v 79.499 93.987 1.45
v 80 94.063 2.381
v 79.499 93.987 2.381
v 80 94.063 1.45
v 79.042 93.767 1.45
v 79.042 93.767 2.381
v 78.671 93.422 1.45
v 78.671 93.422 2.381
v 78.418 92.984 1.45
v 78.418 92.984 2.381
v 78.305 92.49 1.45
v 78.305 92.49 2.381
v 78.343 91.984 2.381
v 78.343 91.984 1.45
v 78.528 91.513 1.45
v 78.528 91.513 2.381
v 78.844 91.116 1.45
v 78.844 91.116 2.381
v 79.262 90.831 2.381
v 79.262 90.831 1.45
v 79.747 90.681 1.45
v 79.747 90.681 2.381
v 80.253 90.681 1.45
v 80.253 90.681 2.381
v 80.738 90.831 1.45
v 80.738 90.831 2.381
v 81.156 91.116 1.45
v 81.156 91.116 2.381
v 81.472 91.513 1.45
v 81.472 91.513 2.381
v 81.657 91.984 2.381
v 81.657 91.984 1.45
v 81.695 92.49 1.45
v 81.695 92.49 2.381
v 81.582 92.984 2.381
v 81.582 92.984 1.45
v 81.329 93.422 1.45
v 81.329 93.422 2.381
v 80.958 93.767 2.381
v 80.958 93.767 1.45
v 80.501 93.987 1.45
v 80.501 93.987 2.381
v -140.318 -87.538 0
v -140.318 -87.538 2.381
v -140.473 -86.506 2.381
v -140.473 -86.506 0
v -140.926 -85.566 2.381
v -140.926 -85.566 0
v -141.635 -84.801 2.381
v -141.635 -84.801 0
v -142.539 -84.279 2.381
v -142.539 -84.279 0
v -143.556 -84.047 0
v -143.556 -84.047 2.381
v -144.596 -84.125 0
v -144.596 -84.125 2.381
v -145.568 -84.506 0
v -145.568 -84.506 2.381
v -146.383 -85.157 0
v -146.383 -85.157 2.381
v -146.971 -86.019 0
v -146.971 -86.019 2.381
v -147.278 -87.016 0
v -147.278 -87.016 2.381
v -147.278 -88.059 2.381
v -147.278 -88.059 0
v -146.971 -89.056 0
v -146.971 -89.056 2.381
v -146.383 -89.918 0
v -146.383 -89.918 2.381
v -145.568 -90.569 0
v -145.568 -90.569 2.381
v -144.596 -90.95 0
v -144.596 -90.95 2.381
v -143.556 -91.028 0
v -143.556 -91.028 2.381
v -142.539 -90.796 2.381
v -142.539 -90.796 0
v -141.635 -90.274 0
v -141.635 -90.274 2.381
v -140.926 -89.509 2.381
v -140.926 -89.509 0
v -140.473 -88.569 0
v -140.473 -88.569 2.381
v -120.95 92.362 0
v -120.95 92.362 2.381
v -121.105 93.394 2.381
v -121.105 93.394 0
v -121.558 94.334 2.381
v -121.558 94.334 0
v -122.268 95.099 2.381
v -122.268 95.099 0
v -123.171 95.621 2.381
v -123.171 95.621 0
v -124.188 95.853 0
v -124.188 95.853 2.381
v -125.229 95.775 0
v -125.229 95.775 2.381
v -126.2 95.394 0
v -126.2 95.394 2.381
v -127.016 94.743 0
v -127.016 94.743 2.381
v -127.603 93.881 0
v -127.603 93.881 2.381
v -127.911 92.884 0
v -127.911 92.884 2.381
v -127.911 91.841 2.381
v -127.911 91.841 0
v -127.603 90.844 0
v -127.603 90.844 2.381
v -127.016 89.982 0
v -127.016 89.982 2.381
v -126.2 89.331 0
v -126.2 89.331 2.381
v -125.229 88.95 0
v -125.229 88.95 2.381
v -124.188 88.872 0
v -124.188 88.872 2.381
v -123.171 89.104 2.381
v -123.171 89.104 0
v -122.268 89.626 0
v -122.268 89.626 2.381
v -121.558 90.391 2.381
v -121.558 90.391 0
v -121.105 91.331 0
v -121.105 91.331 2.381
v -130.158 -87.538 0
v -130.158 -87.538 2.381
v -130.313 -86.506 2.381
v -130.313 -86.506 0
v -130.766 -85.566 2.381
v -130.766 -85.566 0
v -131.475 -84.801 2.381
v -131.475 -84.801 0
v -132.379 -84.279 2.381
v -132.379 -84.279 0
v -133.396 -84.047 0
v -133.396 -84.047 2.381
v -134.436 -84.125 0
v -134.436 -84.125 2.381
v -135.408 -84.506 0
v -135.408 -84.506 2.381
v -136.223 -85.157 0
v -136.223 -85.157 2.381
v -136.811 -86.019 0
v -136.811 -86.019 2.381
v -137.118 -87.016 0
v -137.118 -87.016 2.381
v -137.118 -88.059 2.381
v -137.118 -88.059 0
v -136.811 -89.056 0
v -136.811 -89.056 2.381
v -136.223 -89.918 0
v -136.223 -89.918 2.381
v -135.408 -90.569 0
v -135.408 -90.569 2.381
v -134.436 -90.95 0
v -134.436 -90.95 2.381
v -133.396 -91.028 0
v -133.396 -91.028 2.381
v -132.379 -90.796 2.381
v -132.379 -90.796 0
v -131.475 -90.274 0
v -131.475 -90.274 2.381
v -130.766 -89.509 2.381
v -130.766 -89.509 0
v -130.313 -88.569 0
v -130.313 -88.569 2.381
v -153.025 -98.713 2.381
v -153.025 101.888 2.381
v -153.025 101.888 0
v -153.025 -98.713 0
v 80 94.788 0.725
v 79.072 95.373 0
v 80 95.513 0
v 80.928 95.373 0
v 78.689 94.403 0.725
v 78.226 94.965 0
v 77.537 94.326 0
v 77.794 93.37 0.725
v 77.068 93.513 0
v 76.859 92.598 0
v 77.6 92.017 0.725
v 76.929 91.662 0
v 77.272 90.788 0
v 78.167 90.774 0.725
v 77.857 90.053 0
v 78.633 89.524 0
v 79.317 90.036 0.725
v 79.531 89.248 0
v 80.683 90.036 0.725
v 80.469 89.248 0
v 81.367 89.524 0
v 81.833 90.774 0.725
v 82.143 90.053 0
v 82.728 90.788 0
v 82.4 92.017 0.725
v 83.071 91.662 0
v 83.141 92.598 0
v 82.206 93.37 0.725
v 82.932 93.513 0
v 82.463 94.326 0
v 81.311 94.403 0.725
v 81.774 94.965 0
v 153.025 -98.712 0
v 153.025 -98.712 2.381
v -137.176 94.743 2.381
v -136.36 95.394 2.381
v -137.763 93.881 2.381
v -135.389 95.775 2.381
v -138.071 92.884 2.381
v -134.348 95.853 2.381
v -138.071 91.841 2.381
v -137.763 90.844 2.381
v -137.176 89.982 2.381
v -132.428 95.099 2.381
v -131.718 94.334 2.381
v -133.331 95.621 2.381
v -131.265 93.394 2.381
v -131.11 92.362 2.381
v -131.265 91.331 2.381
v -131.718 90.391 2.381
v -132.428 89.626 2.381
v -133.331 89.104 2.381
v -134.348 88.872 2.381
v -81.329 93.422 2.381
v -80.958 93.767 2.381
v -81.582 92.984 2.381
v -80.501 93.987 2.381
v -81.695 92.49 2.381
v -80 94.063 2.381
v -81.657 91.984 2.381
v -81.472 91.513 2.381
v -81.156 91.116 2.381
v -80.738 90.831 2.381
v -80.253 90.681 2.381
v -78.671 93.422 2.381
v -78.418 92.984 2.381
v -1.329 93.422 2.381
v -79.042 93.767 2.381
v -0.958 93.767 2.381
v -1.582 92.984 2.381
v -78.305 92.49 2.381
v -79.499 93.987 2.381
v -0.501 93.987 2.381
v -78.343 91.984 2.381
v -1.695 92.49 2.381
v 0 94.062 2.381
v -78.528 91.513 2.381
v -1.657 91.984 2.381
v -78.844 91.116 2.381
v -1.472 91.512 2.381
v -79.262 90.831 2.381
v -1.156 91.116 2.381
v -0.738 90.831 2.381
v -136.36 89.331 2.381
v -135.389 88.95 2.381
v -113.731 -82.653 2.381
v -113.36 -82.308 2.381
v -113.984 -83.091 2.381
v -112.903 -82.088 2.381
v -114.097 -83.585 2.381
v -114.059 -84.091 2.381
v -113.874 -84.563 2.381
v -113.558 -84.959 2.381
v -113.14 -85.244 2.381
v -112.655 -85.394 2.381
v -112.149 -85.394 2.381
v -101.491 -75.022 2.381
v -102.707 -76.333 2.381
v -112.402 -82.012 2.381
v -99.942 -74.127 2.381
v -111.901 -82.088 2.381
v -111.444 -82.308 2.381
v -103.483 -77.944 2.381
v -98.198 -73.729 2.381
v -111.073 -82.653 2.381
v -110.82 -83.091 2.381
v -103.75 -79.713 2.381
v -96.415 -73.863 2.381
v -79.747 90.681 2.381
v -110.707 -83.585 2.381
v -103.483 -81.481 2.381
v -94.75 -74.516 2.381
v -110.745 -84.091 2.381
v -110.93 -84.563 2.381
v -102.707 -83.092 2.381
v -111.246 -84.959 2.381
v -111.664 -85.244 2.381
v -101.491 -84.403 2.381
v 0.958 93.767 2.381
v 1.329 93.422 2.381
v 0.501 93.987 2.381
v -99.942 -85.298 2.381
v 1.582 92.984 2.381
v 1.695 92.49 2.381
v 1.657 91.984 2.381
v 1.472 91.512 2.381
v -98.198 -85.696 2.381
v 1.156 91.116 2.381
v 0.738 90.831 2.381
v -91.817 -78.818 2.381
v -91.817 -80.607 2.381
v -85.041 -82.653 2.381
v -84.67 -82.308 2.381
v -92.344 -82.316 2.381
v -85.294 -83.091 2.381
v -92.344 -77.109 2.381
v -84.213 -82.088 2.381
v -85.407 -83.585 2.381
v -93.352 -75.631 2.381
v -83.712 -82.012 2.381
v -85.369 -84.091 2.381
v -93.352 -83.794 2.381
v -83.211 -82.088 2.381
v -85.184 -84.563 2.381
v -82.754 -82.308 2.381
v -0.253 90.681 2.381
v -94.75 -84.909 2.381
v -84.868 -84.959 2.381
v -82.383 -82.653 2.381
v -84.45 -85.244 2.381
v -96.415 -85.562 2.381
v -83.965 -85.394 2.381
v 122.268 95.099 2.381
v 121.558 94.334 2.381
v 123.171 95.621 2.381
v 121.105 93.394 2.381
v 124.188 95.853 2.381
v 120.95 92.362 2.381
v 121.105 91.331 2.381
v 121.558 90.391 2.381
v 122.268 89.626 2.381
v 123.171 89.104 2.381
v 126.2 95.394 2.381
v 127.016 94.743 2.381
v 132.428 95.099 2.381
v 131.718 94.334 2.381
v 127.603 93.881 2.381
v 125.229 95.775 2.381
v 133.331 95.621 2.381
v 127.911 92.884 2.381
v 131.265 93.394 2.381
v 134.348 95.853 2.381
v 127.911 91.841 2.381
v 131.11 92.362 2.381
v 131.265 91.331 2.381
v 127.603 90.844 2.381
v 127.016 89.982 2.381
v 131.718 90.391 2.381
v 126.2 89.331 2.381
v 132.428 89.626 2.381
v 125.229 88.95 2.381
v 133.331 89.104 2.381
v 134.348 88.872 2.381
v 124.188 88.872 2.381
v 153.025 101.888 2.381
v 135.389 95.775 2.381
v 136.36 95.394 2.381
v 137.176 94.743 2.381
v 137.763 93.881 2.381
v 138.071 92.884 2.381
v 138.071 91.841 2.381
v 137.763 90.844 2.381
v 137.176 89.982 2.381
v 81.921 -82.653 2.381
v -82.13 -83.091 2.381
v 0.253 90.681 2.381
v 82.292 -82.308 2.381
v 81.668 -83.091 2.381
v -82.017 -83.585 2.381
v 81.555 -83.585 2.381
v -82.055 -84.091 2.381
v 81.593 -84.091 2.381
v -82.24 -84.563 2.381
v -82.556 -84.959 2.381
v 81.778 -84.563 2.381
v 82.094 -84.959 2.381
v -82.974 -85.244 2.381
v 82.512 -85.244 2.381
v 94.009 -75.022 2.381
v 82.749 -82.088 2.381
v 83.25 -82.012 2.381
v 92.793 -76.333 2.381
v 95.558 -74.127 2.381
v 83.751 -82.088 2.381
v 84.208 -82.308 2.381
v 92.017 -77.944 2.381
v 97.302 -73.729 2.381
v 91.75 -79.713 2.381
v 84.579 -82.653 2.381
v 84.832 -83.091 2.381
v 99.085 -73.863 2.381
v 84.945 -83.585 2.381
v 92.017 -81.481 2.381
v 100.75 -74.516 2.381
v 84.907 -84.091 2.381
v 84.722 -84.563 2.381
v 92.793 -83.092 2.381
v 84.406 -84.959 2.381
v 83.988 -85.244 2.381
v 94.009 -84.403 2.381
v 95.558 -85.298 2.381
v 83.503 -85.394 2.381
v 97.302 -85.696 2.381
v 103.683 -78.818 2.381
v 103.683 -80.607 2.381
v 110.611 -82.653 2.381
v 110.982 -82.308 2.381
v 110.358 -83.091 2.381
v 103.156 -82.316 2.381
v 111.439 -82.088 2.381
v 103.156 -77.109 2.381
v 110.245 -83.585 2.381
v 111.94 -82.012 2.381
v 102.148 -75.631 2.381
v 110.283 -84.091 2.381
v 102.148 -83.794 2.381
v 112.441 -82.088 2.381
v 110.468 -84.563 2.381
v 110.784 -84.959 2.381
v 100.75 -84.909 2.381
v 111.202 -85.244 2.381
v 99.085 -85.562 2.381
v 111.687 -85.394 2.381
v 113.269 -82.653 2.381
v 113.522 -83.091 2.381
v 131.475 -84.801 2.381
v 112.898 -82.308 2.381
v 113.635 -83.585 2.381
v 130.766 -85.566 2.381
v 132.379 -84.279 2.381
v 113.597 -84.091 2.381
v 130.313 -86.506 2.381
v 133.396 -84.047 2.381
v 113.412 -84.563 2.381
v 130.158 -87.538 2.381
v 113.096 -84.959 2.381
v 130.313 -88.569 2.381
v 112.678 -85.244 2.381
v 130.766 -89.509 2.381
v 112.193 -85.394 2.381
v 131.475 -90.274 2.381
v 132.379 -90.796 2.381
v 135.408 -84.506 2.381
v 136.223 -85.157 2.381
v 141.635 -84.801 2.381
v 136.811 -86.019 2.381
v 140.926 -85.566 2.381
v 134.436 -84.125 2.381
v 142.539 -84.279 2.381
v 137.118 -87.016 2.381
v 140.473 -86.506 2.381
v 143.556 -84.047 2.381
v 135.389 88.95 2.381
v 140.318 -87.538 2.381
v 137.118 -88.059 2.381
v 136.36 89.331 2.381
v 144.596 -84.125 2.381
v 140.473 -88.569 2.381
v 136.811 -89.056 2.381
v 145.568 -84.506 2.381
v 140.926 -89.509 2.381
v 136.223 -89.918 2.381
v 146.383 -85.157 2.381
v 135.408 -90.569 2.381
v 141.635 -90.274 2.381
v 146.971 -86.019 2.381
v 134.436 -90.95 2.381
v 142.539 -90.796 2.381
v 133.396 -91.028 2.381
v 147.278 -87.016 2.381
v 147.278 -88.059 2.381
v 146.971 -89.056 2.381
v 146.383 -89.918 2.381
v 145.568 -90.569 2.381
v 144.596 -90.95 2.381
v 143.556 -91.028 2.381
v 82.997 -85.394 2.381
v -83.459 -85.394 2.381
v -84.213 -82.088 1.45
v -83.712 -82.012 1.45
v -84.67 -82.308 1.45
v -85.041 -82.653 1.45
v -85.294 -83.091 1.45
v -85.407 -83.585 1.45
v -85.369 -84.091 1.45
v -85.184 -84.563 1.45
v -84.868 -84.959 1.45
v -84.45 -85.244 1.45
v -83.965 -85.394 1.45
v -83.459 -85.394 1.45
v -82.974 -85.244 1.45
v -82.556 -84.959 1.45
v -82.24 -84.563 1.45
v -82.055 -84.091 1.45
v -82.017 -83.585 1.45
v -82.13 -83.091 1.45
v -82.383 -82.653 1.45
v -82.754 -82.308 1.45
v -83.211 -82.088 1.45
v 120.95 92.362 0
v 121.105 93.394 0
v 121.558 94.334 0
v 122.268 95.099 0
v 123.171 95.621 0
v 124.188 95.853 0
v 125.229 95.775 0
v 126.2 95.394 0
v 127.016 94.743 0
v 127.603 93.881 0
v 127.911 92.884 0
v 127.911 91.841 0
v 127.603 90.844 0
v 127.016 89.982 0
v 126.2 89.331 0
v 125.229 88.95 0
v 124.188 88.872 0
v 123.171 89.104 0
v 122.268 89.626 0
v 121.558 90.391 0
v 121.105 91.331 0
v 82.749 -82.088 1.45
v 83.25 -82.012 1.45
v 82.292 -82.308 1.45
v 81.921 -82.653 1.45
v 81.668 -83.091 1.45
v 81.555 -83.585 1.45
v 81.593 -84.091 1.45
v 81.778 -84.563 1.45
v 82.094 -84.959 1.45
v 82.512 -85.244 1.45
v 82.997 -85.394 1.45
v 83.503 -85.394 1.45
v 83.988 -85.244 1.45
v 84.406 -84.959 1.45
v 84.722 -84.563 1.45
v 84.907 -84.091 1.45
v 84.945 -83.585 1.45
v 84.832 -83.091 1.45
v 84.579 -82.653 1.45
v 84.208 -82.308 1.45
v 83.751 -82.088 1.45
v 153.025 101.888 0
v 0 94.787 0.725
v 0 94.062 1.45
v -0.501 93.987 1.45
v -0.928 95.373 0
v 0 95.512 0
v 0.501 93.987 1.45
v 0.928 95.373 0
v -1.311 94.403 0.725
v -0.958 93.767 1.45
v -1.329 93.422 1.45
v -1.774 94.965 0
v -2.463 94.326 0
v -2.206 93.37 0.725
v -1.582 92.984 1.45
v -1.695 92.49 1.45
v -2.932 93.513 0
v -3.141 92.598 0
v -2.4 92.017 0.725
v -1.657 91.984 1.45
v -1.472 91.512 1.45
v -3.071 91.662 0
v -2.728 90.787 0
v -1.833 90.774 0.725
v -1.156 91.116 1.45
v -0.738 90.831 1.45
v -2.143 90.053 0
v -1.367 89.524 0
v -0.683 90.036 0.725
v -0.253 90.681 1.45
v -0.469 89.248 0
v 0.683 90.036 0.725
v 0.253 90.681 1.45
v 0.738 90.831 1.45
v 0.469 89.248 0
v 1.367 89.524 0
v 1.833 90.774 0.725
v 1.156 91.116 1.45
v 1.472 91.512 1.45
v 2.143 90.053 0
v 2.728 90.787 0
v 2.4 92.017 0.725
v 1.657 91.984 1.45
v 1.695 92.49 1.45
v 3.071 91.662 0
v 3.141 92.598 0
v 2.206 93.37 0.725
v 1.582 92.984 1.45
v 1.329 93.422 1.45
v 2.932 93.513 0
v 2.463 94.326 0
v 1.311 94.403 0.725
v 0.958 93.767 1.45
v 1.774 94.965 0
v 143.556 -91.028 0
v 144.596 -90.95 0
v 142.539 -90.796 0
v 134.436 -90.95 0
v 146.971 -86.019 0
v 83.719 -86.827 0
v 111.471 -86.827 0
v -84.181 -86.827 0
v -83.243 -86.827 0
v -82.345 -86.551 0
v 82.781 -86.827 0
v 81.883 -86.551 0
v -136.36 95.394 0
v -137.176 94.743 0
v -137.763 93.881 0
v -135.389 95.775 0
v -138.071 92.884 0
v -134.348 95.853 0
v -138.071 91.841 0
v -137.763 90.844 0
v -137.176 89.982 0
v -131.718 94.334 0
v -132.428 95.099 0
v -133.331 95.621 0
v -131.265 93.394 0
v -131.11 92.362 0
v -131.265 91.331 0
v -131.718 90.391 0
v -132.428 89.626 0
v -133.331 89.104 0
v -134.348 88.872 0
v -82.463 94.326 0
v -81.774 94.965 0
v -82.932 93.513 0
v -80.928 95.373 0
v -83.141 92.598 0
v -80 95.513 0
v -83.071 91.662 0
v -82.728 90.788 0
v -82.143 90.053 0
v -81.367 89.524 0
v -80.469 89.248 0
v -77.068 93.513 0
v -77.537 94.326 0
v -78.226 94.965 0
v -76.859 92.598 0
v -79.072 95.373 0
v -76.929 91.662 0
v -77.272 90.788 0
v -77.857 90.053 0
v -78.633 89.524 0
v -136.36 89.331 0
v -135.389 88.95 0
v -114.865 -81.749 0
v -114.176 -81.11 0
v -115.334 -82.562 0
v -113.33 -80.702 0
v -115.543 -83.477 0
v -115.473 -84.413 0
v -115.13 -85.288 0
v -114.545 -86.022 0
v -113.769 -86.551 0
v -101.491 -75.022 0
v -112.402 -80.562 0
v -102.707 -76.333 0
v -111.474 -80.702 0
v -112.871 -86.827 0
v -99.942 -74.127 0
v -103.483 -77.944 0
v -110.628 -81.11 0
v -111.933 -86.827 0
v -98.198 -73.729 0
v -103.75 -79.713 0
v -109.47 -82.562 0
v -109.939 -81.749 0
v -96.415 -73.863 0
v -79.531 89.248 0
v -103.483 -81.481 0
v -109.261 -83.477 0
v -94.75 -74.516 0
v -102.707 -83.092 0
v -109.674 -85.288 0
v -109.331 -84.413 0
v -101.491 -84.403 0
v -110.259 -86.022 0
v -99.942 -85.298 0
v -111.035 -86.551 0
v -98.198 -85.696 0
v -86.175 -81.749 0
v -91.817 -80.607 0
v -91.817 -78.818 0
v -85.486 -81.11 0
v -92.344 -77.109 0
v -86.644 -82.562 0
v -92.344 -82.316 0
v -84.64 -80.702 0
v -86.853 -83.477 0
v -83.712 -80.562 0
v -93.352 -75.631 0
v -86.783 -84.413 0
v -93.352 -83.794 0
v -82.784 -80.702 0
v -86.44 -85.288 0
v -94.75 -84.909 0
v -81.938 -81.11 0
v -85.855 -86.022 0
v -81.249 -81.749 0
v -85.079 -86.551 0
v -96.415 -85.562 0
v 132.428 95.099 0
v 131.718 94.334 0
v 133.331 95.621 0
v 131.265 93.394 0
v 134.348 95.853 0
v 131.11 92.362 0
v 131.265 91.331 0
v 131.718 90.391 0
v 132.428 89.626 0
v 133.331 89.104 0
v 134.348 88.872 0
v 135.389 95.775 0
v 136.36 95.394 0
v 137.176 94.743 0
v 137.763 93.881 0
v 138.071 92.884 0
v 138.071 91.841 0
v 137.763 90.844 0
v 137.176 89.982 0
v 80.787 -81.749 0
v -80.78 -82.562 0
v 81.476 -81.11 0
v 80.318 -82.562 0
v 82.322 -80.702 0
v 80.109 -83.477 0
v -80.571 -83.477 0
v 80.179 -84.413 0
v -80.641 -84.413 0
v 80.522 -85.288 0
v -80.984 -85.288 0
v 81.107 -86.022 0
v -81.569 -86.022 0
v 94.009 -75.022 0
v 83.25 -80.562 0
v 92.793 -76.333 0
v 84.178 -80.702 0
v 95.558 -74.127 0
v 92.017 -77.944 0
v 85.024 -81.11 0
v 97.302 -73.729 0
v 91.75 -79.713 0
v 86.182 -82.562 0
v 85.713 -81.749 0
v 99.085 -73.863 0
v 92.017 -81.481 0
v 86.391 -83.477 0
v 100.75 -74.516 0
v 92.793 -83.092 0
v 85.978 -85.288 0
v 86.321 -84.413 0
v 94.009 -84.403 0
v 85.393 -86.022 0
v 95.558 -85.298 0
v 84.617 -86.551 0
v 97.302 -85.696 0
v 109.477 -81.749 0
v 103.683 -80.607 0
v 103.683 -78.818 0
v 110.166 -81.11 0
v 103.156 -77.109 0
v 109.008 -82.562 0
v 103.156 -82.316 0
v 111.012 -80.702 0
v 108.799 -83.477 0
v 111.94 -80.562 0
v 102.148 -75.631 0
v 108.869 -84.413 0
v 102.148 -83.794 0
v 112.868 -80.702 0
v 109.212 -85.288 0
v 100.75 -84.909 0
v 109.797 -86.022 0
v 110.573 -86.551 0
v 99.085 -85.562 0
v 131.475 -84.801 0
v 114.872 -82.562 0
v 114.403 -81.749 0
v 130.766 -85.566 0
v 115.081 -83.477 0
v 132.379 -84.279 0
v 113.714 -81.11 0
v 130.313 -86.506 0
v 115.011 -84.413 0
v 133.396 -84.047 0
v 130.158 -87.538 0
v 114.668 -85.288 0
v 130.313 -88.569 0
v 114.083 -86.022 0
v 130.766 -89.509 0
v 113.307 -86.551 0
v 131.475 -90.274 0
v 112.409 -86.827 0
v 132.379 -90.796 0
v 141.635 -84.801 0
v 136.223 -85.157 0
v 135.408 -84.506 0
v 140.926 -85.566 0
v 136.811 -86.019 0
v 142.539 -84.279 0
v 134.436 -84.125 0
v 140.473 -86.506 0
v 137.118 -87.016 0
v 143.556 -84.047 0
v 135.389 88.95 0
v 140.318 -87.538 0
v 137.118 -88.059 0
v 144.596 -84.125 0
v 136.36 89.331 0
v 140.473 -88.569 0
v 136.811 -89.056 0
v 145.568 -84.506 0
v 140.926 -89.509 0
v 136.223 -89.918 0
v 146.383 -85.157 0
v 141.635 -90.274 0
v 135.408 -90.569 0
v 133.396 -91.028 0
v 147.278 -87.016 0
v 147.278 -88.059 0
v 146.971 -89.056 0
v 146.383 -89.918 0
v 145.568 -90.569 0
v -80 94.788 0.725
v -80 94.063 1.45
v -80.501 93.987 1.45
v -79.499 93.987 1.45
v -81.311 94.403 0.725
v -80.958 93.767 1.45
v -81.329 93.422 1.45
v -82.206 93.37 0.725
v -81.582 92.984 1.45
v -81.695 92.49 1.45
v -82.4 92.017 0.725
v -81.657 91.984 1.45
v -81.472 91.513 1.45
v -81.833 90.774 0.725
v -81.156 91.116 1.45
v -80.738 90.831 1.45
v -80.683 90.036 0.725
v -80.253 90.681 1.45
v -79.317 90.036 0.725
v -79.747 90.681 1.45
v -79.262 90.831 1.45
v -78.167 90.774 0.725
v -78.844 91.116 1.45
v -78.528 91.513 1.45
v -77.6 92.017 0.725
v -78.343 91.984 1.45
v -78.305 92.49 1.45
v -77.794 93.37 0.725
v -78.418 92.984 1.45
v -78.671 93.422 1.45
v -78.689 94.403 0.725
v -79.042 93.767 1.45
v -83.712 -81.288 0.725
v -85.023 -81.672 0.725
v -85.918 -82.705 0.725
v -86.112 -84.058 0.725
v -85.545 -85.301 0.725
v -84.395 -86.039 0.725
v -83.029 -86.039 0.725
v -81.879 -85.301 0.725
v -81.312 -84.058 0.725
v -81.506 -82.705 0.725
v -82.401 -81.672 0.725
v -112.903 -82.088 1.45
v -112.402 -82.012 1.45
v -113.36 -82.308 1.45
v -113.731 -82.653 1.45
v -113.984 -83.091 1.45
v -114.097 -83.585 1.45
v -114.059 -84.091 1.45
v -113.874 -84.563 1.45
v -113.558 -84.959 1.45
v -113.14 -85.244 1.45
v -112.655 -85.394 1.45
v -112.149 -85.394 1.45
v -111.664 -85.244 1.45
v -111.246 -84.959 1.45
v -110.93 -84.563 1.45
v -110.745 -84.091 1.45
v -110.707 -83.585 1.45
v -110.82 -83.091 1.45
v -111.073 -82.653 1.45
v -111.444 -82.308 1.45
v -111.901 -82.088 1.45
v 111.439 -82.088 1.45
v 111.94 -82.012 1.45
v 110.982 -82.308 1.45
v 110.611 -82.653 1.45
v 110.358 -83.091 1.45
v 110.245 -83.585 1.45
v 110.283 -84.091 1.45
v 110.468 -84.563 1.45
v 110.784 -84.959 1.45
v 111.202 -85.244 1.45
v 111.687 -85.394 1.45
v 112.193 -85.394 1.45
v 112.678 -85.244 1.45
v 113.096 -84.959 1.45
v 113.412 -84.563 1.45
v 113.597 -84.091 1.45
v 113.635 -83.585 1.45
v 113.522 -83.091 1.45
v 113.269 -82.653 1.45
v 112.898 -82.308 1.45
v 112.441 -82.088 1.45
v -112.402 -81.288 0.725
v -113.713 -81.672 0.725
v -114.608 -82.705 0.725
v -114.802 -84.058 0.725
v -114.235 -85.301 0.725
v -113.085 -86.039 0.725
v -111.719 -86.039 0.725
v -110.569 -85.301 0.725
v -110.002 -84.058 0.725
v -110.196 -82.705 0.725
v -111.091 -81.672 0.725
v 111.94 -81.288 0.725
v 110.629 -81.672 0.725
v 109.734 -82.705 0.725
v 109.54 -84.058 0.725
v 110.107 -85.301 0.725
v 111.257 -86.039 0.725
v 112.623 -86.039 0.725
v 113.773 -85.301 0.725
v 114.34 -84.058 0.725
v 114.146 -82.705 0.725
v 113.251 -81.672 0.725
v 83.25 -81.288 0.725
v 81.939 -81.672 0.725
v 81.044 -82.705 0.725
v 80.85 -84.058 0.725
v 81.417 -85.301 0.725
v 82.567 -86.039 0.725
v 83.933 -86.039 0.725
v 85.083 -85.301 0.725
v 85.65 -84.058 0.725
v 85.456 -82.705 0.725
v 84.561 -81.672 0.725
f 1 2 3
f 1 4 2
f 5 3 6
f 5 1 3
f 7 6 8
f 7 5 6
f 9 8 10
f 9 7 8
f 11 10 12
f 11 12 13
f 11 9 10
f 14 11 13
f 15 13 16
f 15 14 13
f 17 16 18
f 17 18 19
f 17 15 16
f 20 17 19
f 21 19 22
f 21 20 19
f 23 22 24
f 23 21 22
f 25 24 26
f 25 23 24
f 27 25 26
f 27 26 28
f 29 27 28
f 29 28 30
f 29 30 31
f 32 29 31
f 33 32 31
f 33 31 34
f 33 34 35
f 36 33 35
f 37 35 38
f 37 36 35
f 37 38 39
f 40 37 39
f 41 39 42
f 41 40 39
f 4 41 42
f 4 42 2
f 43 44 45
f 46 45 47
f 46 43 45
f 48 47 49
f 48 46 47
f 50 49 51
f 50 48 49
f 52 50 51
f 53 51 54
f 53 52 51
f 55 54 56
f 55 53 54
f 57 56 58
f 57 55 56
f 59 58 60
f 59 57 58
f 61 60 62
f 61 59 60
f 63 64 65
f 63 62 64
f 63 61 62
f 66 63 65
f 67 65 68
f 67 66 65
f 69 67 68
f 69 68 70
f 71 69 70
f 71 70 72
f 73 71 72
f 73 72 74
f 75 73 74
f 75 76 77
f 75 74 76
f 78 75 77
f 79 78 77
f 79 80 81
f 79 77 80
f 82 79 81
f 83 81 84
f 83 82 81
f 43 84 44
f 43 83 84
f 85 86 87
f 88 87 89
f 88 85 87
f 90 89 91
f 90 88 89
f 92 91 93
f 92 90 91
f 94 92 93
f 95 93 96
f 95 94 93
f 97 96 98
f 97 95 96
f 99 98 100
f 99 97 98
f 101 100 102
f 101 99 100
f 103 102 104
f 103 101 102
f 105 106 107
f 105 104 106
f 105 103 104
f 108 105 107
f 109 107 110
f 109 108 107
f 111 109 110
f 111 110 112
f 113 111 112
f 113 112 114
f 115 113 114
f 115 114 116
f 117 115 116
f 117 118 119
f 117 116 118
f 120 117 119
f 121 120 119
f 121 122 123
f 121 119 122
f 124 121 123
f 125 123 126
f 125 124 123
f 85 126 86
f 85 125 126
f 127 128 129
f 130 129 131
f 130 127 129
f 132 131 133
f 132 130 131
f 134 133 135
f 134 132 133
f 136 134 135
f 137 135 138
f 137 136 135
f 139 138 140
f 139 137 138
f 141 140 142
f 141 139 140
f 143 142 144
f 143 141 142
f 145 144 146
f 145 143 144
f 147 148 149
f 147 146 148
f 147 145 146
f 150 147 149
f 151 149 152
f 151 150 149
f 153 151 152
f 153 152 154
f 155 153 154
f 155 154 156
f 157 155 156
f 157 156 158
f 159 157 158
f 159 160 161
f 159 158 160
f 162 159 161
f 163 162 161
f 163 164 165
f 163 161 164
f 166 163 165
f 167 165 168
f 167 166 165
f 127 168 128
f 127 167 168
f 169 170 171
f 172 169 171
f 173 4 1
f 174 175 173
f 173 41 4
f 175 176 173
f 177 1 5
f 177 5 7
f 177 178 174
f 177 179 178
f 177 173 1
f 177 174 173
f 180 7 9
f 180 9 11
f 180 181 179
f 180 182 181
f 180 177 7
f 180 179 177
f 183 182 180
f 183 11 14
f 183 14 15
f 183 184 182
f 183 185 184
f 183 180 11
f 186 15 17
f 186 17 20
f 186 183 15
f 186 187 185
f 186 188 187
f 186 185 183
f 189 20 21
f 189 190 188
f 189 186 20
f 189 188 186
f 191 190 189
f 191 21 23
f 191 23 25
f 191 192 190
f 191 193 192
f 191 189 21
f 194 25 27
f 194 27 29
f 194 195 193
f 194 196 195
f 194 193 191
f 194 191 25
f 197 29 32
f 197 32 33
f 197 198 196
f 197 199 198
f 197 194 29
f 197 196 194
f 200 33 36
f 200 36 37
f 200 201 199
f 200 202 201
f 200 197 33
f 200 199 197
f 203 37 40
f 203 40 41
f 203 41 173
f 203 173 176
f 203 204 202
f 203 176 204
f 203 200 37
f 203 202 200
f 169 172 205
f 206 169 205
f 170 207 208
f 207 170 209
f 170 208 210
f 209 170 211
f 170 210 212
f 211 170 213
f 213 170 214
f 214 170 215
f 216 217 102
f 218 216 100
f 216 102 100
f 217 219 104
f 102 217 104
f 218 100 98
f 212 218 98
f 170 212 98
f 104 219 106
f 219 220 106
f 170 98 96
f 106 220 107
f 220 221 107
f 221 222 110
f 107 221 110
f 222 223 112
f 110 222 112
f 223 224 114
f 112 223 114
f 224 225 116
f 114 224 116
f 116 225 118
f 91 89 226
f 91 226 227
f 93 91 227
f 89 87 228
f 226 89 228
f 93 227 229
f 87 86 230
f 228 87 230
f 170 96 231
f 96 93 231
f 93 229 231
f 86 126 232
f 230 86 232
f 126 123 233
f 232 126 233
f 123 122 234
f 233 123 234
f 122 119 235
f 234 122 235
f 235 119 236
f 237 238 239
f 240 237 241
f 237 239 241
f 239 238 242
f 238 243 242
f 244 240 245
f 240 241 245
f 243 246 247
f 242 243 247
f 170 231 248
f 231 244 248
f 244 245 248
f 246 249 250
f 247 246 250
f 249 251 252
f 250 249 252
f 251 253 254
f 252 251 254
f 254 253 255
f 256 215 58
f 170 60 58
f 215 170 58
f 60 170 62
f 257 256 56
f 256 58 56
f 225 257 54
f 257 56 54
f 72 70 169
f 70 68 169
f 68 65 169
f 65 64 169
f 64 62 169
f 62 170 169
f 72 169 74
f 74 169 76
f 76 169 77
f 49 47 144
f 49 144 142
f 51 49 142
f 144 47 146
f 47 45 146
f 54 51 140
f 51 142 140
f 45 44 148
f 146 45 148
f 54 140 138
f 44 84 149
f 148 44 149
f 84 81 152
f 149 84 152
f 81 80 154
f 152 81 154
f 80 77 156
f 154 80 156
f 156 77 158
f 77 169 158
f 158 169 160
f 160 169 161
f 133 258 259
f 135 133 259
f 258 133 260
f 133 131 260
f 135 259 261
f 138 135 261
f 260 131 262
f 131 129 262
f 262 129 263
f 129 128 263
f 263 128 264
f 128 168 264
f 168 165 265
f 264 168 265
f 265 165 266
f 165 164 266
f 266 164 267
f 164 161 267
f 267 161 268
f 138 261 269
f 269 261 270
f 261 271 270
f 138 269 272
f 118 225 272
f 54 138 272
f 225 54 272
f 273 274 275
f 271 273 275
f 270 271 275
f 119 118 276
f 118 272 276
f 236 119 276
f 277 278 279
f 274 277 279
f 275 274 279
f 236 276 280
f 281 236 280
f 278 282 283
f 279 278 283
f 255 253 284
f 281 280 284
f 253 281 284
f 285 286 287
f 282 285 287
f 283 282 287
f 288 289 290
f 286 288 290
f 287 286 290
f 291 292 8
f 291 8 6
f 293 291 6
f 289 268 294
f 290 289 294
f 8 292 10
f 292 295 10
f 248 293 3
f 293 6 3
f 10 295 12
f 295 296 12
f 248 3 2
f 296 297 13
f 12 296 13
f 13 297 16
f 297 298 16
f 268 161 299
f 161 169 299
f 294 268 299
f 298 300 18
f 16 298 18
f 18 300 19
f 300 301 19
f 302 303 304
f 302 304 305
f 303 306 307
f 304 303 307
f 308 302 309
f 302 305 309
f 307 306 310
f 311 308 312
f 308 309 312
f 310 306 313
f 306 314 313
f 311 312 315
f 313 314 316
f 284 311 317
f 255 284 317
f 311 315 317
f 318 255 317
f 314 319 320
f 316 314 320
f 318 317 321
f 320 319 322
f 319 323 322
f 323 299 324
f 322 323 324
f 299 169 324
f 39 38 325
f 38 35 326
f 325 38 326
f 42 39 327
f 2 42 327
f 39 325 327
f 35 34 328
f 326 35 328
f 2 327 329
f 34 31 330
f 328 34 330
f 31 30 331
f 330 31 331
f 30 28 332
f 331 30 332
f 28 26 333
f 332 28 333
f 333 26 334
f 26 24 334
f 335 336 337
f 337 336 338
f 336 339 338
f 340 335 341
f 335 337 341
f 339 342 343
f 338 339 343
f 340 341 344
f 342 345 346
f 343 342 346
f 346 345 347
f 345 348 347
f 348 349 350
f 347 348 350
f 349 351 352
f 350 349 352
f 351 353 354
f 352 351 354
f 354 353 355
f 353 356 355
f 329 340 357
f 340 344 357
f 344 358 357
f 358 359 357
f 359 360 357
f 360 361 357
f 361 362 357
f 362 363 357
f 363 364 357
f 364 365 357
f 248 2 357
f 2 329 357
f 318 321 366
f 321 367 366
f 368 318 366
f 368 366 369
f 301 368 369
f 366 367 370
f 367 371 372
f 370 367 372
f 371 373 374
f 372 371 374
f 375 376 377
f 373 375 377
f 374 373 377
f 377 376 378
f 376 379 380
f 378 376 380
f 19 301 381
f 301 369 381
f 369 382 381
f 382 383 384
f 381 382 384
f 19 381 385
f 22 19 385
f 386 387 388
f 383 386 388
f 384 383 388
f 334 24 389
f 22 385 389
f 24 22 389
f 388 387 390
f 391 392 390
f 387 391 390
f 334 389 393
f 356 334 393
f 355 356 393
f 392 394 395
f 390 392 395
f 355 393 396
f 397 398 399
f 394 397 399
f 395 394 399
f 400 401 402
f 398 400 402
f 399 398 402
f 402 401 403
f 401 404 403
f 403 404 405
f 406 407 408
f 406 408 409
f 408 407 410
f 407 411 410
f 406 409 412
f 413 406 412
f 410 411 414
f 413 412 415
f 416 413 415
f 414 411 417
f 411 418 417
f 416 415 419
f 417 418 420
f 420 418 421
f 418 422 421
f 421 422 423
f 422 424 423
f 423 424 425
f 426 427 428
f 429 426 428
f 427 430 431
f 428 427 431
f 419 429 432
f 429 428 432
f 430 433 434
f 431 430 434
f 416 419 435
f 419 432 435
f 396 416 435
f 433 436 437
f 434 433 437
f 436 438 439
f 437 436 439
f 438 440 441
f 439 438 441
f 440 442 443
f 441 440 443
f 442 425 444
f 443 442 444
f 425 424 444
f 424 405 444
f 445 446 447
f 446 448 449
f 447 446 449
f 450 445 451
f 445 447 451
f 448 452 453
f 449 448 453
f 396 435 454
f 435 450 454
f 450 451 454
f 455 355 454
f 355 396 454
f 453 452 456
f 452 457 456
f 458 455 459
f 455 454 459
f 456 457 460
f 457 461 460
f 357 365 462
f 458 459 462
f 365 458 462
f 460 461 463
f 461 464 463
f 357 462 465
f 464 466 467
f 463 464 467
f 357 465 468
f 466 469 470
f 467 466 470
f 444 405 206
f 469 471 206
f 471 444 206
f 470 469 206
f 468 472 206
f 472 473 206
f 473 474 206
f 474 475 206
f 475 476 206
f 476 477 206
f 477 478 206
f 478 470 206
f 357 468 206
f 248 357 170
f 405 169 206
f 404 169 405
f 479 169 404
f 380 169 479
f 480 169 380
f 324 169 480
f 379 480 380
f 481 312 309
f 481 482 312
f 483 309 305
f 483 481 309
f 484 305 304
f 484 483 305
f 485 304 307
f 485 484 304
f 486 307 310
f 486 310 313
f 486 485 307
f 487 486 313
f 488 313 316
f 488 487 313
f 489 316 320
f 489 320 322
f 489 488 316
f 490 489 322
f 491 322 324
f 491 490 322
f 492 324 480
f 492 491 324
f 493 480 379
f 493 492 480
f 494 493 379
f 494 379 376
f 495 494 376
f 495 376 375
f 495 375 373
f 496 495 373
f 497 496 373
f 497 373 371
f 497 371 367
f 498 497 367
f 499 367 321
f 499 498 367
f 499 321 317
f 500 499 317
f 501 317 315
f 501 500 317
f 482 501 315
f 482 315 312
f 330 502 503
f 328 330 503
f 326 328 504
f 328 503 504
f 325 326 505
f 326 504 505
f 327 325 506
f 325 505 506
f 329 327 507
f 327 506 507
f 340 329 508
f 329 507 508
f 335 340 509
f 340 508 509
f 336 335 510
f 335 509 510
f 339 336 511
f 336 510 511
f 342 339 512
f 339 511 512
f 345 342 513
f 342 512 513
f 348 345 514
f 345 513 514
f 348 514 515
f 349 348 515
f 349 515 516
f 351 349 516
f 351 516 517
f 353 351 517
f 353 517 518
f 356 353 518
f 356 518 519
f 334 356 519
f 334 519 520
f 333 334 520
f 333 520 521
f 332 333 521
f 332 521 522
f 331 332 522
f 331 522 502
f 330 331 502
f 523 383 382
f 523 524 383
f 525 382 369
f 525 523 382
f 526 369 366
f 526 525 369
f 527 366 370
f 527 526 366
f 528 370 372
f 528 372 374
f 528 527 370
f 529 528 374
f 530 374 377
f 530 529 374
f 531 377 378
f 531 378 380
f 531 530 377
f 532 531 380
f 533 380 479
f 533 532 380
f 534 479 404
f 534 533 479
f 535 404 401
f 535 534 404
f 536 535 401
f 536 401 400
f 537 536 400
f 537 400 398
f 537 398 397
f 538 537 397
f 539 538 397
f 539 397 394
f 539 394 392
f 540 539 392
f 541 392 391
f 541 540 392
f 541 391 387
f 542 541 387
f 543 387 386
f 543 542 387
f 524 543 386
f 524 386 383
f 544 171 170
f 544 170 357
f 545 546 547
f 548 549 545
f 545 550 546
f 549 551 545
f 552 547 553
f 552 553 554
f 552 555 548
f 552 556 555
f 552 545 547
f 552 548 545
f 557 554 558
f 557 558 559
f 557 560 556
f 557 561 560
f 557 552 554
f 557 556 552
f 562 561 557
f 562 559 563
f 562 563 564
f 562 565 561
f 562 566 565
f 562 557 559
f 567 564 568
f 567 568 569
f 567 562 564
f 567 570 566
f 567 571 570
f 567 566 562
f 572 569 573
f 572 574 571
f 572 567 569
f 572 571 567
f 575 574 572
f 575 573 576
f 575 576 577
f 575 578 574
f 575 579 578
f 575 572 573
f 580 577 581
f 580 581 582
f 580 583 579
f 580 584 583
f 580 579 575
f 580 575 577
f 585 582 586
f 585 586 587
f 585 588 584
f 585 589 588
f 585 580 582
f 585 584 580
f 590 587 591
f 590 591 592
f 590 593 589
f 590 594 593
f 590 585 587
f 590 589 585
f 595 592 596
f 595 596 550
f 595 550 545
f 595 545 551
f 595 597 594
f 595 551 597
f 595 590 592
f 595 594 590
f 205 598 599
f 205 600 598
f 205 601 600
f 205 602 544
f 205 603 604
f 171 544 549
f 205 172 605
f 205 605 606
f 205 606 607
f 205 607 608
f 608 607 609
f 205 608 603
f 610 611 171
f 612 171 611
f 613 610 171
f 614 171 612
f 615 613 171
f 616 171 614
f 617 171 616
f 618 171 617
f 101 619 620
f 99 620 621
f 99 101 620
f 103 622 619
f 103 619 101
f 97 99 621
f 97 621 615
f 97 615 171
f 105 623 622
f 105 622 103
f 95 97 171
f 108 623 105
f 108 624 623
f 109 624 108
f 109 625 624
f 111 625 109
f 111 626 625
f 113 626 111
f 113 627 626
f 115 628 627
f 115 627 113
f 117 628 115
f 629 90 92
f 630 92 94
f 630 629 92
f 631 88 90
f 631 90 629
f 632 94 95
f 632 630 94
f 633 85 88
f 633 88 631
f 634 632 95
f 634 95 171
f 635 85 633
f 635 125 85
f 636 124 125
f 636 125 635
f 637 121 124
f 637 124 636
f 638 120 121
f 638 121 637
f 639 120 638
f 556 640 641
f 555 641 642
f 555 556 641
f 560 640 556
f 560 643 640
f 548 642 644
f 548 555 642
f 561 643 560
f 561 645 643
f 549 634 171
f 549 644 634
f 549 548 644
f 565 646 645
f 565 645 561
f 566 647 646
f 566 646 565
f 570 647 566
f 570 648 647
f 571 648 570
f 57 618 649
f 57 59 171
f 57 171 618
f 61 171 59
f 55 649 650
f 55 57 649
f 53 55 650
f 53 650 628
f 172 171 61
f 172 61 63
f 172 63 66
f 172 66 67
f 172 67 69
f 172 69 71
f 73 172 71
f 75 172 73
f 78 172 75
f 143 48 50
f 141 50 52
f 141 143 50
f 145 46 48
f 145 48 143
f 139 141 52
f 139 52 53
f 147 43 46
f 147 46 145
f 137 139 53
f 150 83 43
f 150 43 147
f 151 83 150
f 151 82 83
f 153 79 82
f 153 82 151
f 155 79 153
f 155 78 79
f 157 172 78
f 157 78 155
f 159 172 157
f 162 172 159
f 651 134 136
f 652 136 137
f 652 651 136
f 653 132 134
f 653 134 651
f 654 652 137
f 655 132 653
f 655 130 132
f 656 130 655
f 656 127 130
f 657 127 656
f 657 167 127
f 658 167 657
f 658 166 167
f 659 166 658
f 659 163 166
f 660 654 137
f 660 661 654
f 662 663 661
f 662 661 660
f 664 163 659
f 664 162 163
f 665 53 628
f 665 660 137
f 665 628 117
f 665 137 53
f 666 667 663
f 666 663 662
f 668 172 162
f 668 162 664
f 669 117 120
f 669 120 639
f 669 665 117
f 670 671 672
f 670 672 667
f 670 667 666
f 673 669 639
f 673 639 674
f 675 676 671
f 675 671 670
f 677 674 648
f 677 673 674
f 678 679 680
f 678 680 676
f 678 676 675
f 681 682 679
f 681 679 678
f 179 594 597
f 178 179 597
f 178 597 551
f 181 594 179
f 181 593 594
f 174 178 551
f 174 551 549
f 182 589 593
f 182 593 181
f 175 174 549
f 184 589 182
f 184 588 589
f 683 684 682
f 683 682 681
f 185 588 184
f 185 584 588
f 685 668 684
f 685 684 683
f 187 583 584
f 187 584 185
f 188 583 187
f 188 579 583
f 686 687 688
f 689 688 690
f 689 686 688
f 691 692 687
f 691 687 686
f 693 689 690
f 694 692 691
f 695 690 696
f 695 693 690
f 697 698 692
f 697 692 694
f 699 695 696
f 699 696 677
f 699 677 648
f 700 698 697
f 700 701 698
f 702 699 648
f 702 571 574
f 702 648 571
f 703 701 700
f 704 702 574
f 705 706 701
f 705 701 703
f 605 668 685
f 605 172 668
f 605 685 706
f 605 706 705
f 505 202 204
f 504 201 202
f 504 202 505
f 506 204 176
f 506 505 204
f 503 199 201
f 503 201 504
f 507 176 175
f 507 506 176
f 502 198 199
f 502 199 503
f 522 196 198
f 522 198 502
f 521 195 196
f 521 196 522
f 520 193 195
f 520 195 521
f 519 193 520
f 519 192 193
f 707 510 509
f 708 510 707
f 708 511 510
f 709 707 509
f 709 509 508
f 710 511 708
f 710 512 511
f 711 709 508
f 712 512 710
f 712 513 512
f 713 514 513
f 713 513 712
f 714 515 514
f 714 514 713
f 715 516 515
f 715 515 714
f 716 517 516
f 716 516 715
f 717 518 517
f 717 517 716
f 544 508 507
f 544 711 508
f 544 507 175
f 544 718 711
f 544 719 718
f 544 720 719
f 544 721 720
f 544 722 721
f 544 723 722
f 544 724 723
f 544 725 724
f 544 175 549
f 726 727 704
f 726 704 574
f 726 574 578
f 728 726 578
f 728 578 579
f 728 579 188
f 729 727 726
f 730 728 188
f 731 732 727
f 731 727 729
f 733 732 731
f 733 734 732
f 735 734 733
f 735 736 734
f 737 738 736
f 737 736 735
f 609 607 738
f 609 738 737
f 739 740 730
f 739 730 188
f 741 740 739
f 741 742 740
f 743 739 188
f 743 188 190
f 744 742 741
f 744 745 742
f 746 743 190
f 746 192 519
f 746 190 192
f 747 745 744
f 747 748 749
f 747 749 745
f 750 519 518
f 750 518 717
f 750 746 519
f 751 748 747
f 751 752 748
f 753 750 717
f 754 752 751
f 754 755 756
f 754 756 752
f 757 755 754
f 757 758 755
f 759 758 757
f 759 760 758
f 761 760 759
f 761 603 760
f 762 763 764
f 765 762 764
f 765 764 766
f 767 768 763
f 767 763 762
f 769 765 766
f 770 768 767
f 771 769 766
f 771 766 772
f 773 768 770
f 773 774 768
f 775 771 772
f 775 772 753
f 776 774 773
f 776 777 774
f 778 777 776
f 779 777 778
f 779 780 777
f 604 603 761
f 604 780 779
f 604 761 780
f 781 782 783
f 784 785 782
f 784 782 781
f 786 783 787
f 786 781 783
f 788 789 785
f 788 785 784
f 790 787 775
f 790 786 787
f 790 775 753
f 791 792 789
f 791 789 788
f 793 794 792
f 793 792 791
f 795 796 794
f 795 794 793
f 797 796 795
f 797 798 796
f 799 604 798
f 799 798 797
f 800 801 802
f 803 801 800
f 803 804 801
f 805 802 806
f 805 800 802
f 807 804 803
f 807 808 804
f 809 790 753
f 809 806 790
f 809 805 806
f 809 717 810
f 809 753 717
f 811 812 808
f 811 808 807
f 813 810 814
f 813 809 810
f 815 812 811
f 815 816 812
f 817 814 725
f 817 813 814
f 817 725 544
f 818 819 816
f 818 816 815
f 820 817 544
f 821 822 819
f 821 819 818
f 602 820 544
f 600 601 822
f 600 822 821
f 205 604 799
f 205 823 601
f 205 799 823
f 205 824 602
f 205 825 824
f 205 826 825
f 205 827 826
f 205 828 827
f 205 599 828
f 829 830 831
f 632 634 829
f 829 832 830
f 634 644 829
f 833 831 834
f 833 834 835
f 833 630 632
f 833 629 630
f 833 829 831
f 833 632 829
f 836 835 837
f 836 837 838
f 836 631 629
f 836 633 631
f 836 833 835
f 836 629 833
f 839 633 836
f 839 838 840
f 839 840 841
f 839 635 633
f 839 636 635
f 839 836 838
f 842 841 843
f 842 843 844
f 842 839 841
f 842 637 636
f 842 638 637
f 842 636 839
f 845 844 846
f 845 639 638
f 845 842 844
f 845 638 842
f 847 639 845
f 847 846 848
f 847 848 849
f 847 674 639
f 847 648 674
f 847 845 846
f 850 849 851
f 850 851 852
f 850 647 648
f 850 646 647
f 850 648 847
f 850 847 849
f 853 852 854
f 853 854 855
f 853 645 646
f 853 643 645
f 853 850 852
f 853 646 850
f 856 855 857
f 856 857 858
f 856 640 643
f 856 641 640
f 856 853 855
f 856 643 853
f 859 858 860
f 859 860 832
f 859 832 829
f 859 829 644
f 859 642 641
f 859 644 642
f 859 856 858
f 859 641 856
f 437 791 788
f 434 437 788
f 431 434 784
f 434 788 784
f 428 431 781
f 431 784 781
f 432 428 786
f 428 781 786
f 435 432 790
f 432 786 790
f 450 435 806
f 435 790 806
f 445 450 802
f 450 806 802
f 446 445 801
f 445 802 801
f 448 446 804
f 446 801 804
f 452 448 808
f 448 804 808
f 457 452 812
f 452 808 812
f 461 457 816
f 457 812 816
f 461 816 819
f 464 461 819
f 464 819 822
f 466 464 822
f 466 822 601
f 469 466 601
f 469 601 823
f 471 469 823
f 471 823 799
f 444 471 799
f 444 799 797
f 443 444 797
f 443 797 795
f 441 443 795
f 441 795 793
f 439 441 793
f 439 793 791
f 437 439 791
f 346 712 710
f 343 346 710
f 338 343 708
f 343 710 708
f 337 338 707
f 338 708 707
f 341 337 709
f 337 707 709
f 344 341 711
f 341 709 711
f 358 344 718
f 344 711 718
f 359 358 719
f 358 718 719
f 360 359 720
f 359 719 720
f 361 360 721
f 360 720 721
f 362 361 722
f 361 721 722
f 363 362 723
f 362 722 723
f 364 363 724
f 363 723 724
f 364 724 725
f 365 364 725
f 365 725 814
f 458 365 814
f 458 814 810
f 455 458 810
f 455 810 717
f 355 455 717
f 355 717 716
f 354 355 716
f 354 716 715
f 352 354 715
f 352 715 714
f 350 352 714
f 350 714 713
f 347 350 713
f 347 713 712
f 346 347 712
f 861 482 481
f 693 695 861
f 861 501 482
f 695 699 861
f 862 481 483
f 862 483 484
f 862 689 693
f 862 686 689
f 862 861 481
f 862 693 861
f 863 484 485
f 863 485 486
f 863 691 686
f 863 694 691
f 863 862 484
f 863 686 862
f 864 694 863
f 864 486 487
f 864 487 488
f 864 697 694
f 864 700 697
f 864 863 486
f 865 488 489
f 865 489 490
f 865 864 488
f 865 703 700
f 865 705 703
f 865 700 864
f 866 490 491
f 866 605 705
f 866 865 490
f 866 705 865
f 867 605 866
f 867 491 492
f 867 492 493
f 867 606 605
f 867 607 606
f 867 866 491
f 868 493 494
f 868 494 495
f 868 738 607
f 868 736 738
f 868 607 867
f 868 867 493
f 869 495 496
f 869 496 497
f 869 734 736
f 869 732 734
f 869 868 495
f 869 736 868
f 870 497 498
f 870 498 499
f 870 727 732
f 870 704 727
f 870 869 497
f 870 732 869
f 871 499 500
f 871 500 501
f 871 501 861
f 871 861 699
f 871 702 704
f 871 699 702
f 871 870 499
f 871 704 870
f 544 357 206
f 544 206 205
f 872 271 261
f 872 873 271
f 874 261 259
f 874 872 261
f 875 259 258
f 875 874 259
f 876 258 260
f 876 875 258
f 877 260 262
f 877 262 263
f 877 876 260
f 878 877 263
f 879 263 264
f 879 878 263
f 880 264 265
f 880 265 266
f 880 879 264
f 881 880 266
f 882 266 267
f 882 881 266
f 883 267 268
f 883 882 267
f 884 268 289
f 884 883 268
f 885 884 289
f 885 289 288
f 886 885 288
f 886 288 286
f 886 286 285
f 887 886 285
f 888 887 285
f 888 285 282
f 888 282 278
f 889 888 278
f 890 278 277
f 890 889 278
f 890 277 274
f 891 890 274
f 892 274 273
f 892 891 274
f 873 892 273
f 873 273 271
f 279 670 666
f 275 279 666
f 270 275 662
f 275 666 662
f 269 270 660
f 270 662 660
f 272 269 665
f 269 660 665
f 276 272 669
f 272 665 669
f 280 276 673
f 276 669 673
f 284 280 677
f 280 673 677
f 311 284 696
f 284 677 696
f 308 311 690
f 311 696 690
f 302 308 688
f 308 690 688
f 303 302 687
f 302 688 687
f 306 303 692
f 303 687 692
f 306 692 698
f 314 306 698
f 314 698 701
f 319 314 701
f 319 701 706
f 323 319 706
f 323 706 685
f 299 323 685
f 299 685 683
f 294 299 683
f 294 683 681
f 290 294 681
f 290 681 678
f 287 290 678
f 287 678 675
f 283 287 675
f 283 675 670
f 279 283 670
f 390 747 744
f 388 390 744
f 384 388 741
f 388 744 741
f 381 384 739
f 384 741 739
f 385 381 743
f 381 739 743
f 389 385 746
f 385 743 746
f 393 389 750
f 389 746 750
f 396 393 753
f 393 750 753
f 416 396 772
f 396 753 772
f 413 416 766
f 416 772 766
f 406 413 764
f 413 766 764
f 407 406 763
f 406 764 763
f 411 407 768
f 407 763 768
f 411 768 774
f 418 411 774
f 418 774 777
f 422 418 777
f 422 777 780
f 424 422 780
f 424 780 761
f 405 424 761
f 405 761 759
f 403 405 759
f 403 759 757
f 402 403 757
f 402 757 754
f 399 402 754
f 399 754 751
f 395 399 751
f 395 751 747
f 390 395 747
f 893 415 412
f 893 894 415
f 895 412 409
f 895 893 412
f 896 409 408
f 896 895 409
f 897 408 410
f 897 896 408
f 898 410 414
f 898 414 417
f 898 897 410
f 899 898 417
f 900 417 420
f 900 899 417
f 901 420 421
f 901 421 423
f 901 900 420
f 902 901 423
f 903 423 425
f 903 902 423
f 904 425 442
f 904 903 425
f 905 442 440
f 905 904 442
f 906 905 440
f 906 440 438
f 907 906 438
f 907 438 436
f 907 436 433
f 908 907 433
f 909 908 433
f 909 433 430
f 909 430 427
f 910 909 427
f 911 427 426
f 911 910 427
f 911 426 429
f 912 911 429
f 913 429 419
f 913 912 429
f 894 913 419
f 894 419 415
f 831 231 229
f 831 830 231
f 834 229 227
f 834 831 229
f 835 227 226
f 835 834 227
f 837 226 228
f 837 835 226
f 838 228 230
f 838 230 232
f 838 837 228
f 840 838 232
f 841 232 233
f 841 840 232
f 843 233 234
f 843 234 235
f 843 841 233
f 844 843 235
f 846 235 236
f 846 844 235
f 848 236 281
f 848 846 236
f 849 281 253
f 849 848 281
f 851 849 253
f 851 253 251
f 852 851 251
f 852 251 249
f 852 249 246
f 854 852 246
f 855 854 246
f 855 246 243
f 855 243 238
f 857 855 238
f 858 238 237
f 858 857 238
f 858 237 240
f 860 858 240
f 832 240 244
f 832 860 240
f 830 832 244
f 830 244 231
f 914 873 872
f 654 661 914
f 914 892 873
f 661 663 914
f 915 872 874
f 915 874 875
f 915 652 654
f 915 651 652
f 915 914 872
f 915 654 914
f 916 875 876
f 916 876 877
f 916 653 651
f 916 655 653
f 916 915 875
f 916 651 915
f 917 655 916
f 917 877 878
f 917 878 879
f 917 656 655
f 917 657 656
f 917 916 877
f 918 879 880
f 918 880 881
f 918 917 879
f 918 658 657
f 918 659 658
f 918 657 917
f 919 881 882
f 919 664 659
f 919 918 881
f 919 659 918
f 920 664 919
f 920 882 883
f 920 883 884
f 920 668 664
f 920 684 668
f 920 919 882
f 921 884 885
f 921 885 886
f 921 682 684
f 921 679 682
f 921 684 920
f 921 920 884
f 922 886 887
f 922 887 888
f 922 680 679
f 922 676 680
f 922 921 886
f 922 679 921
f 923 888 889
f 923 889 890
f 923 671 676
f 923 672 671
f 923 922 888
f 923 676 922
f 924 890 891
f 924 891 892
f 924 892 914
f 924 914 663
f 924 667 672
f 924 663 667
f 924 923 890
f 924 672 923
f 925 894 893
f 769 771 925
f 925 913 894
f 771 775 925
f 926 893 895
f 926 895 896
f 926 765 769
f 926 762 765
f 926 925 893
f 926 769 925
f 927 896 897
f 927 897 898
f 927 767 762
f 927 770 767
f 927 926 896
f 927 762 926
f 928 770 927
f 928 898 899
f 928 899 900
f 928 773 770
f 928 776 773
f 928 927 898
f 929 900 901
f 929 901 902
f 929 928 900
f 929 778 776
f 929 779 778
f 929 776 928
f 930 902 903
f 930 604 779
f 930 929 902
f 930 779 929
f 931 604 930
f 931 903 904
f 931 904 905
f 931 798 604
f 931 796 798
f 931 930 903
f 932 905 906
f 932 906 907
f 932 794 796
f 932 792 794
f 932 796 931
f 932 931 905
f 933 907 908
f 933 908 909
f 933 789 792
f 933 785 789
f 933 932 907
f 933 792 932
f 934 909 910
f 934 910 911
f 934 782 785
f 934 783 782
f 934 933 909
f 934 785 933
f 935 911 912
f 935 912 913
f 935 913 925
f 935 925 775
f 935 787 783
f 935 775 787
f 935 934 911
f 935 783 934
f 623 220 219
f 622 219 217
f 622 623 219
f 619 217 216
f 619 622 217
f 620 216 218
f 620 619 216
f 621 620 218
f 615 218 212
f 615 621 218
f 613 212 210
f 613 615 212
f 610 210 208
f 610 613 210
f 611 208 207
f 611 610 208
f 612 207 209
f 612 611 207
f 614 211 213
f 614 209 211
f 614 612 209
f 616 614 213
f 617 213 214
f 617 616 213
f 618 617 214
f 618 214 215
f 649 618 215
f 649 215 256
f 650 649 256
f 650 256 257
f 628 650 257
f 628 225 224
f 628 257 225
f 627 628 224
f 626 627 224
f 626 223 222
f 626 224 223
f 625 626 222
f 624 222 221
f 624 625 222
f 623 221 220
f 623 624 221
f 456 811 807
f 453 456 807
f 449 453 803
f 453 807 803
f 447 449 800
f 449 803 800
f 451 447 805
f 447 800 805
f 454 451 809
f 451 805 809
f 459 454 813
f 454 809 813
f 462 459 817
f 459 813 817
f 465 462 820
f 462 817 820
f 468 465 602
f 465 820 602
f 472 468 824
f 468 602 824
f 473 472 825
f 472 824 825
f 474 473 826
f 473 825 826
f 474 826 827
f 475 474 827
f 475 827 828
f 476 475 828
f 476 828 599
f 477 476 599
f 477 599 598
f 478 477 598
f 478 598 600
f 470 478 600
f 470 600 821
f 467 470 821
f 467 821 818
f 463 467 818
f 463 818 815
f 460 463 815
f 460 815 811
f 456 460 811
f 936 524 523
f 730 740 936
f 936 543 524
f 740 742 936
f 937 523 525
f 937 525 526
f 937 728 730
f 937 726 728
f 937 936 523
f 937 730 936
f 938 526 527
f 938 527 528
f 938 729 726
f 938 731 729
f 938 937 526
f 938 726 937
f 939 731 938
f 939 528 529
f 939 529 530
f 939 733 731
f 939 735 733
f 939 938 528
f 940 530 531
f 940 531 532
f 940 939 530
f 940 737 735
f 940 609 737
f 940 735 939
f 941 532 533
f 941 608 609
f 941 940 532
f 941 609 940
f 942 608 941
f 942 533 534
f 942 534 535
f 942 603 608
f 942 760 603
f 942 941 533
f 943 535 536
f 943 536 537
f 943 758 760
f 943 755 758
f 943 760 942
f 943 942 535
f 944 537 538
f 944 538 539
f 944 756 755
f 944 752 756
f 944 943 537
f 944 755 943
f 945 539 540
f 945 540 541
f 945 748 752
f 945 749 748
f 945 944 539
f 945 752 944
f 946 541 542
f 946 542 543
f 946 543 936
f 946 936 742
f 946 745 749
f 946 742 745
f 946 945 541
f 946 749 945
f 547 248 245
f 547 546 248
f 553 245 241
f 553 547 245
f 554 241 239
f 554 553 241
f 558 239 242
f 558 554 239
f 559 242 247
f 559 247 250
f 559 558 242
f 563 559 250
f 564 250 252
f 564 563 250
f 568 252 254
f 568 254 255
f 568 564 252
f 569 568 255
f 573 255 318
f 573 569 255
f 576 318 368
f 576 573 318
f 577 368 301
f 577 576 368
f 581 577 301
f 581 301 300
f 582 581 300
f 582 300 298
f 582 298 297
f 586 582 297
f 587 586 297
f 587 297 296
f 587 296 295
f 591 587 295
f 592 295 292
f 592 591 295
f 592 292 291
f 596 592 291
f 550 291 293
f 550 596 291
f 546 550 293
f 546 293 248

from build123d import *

# Parameters (mm, degrees)
SKETCH1_W                                      = 306.05
SKETCH1_H                                      = 197.425
SKETCH1_R                                      = 10.775
BOSS_EXTRUDE1_DEPTH                            = 2.38125
SKETCH9_W                                      = 306.05
SKETCH9_H                                      = 2.38125
BOSS_EXTRUDE2_DEPTH                            = 3.175
SKETCH10_R                                     = 3.5
CUT_EXTRUDE1_DEPTH                             = 184.856965146
CSK_FOR_M3_FLAT_HEAD_MACHINE_SCREW1_AT_2_COUNT = 2
CSK_FOR_M3_FLAT_HEAD_MACHINE_SCREW1_AT_2_PITCH = 28.69
CSK_FOR_M3_FLAT_HEAD_MACHINE_SCREW1_AT_3_COUNT = 2
CSK_FOR_M3_FLAT_HEAD_MACHINE_SCREW1_AT_3_PITCH = 178.948509983
CSK_FOR_M3_FLAT_HEAD_MACHINE_SCREW1_AT_4_COUNT = 2
CSK_FOR_M3_FLAT_HEAD_MACHINE_SCREW1_AT_4_PITCH = 208.645558843
CSK_FOR_M3_FLAT_HEAD_MACHINE_SCREW1_AT_5_COUNT = 2
CSK_FOR_M3_FLAT_HEAD_MACHINE_SCREW1_AT_5_PITCH = 260.467597265
CSK_FOR_M3_FLAT_HEAD_MACHINE_SCREW1_AT_6_COUNT = 2
CSK_FOR_M3_FLAT_HEAD_MACHINE_SCREW1_AT_6_PITCH = 224.342
CSK_FOR_M3_FLAT_HEAD_MACHINE_SCREW1_AT_7_COUNT = 2
CSK_FOR_M3_FLAT_HEAD_MACHINE_SCREW1_AT_7_PITCH = 195.652
SKETCH13_R                                     = 6
CUT_EXTRUDE2_DEPTH                             = 184.856965146


with BuildPart() as part:
    # Sketch1 → Boss-Extrude1 (new body)
    # profile 1 of 5: a face of its own
    with BuildSketch(Plane.XY):
        Rectangle(SKETCH1_W, SKETCH1_H)
        with Locations((-142.25, -87.9375)):
            Circle(SKETCH1_R, mode=Mode.SUBTRACT)
        with Locations((-130.25, -64.9375)):
            Circle(SKETCH1_R, mode=Mode.SUBTRACT)
    # profile 2 of 5: a face of its own
    with BuildSketch(Plane.XY):
        with Locations((-130.25, -64.9375)):
            Circle(SKETCH1_R)
    # profile 3 of 5: a face of its own
    with BuildSketch(Plane.XY):
        with Locations((-142.25, -87.9375)):
            Circle(SKETCH1_R)
    # profile 4 of 5: a face of its own
    with BuildSketch(Plane.XY):
        with BuildLine():
            ThreePointArc((-142.25, -98.7125), (-149.869075567, -95.556575567), (-153.025, -87.9375))
            Line((-153.025, -87.9375), (-153.025, -98.7125))
            Line((-153.025, -98.7125), (-142.25, -98.7125))
        make_face()
    # profile 5 of 5: a face of its own
    with BuildSketch(Plane.XY):
        Rectangle(SKETCH1_W, SKETCH1_H)
    extrude(amount=BOSS_EXTRUDE1_DEPTH)

    # Sketch9 → Boss-Extrude2 (add)
    with BuildSketch(Plane(origin=(0, 98.7125, 0), x_dir=(1, 0, 0), z_dir=(0, 1, 0))):
        with Locations((0, -1.190625)):
            Rectangle(SKETCH9_W, SKETCH9_H)
    extrude(amount=BOSS_EXTRUDE2_DEPTH)

    # Sketch10 → Cut-Extrude1 (cut, through all)
    with BuildSketch(Plane(origin=(0, 0, 0), x_dir=(-1, 0, 0), z_dir=(0, 0, -1))):
        with Locations((-134.610000066, 92.3625)):
            Circle(SKETCH10_R)
        with Locations((-124.450000066, 92.3625)):
            Circle(SKETCH10_R)
        with Locations((-143.817500066, -87.5375001)):
            Circle(SKETCH10_R)
        with Locations((-133.657500066, -87.5375001)):
            Circle(SKETCH10_R)
    cut_extrude1 = extrude(amount=-CUT_EXTRUDE1_DEPTH, mode=Mode.SUBTRACT)

    # Mirror1: Cut-Extrude1 across plane
    add(cut_extrude1.mirror(Plane(origin=(0, 0, 0), x_dir=(0, 0, 1), z_dir=(1, 0, 0))), mode=Mode.SUBTRACT)

    # Sketch12 → CSK for M3 Flat Head Machine Screw1 (revolve, cut)
    with BuildSketch(Plane(origin=(111.94, -83.7125, 0), x_dir=(0, 1, 0), z_dir=(1, 0, 0))):
        Polygon((0, 0), (0, 2.38125), (1.7, 2.38125), (1.7, 1.45), (3.15, 0), align=None)
    csk_for_m3_flat_head_machine_screw1 = revolve(axis=Axis((111.94, -83.7125, -6.35), (0, 0, 1)), mode=Mode.SUBTRACT)

    # CSK for M3 Flat Head Machine Screw1 at 2: CSK for M3 Flat Head Machine Screw1 ×2
    with Locations(*[(-i * CSK_FOR_M3_FLAT_HEAD_MACHINE_SCREW1_AT_2_PITCH, 0, 0) for i in range(1, CSK_FOR_M3_FLAT_HEAD_MACHINE_SCREW1_AT_2_COUNT)]):
        add(csk_for_m3_flat_head_machine_screw1, mode=Mode.SUBTRACT)

    # CSK for M3 Flat Head Machine Screw1 at 3: CSK for M3 Flat Head Machine Screw1 ×2
    with Locations(*[Vector(-0.17848709666869053, 0.9839422525345589, 0) * (i * CSK_FOR_M3_FLAT_HEAD_MACHINE_SCREW1_AT_3_PITCH) for i in range(1, CSK_FOR_M3_FLAT_HEAD_MACHINE_SCREW1_AT_3_COUNT)]):
        add(csk_for_m3_flat_head_machine_screw1, mode=Mode.SUBTRACT)

    # CSK for M3 Flat Head Machine Screw1 at 4: CSK for M3 Flat Head Machine Screw1 ×2
    with Locations(*[Vector(-0.5365079449598512, 0.8438952689729675, 0) * (i * CSK_FOR_M3_FLAT_HEAD_MACHINE_SCREW1_AT_4_PITCH) for i in range(1, CSK_FOR_M3_FLAT_HEAD_MACHINE_SCREW1_AT_4_COUNT)]):
        add(csk_for_m3_flat_head_machine_screw1, mode=Mode.SUBTRACT)

    # CSK for M3 Flat Head Machine Screw1 at 5: CSK for M3 Flat Head Machine Screw1 ×2
    with Locations(*[Vector(-0.7369054808176358, 0.6759957931384847, 0) * (i * CSK_FOR_M3_FLAT_HEAD_MACHINE_SCREW1_AT_5_PITCH) for i in range(1, CSK_FOR_M3_FLAT_HEAD_MACHINE_SCREW1_AT_5_COUNT)]):
        add(csk_for_m3_flat_head_machine_screw1, mode=Mode.SUBTRACT)

    # CSK for M3 Flat Head Machine Screw1 at 6: CSK for M3 Flat Head Machine Screw1 ×2
    with Locations(*[(-i * CSK_FOR_M3_FLAT_HEAD_MACHINE_SCREW1_AT_6_PITCH, 0, 0) for i in range(1, CSK_FOR_M3_FLAT_HEAD_MACHINE_SCREW1_AT_6_COUNT)]):
        add(csk_for_m3_flat_head_machine_screw1, mode=Mode.SUBTRACT)

    # CSK for M3 Flat Head Machine Screw1 at 7: CSK for M3 Flat Head Machine Screw1 ×2
    with Locations(*[(-i * CSK_FOR_M3_FLAT_HEAD_MACHINE_SCREW1_AT_7_PITCH, 0, 0) for i in range(1, CSK_FOR_M3_FLAT_HEAD_MACHINE_SCREW1_AT_7_COUNT)]):
        add(csk_for_m3_flat_head_machine_screw1, mode=Mode.SUBTRACT)

    # Sketch13 → Cut-Extrude2 (cut, through all)
    with BuildSketch(Plane(origin=(0, 0, 0), x_dir=(-1, 0, 0), z_dir=(0, 0, -1))):
        with Locations((-97.75, -79.7125001)):
            Circle(SKETCH13_R)
        with Locations((97.75, -79.7125001)):
            Circle(SKETCH13_R)
    extrude(amount=-CUT_EXTRUDE2_DEPTH, mode=Mode.SUBTRACT)


solid = part.part
